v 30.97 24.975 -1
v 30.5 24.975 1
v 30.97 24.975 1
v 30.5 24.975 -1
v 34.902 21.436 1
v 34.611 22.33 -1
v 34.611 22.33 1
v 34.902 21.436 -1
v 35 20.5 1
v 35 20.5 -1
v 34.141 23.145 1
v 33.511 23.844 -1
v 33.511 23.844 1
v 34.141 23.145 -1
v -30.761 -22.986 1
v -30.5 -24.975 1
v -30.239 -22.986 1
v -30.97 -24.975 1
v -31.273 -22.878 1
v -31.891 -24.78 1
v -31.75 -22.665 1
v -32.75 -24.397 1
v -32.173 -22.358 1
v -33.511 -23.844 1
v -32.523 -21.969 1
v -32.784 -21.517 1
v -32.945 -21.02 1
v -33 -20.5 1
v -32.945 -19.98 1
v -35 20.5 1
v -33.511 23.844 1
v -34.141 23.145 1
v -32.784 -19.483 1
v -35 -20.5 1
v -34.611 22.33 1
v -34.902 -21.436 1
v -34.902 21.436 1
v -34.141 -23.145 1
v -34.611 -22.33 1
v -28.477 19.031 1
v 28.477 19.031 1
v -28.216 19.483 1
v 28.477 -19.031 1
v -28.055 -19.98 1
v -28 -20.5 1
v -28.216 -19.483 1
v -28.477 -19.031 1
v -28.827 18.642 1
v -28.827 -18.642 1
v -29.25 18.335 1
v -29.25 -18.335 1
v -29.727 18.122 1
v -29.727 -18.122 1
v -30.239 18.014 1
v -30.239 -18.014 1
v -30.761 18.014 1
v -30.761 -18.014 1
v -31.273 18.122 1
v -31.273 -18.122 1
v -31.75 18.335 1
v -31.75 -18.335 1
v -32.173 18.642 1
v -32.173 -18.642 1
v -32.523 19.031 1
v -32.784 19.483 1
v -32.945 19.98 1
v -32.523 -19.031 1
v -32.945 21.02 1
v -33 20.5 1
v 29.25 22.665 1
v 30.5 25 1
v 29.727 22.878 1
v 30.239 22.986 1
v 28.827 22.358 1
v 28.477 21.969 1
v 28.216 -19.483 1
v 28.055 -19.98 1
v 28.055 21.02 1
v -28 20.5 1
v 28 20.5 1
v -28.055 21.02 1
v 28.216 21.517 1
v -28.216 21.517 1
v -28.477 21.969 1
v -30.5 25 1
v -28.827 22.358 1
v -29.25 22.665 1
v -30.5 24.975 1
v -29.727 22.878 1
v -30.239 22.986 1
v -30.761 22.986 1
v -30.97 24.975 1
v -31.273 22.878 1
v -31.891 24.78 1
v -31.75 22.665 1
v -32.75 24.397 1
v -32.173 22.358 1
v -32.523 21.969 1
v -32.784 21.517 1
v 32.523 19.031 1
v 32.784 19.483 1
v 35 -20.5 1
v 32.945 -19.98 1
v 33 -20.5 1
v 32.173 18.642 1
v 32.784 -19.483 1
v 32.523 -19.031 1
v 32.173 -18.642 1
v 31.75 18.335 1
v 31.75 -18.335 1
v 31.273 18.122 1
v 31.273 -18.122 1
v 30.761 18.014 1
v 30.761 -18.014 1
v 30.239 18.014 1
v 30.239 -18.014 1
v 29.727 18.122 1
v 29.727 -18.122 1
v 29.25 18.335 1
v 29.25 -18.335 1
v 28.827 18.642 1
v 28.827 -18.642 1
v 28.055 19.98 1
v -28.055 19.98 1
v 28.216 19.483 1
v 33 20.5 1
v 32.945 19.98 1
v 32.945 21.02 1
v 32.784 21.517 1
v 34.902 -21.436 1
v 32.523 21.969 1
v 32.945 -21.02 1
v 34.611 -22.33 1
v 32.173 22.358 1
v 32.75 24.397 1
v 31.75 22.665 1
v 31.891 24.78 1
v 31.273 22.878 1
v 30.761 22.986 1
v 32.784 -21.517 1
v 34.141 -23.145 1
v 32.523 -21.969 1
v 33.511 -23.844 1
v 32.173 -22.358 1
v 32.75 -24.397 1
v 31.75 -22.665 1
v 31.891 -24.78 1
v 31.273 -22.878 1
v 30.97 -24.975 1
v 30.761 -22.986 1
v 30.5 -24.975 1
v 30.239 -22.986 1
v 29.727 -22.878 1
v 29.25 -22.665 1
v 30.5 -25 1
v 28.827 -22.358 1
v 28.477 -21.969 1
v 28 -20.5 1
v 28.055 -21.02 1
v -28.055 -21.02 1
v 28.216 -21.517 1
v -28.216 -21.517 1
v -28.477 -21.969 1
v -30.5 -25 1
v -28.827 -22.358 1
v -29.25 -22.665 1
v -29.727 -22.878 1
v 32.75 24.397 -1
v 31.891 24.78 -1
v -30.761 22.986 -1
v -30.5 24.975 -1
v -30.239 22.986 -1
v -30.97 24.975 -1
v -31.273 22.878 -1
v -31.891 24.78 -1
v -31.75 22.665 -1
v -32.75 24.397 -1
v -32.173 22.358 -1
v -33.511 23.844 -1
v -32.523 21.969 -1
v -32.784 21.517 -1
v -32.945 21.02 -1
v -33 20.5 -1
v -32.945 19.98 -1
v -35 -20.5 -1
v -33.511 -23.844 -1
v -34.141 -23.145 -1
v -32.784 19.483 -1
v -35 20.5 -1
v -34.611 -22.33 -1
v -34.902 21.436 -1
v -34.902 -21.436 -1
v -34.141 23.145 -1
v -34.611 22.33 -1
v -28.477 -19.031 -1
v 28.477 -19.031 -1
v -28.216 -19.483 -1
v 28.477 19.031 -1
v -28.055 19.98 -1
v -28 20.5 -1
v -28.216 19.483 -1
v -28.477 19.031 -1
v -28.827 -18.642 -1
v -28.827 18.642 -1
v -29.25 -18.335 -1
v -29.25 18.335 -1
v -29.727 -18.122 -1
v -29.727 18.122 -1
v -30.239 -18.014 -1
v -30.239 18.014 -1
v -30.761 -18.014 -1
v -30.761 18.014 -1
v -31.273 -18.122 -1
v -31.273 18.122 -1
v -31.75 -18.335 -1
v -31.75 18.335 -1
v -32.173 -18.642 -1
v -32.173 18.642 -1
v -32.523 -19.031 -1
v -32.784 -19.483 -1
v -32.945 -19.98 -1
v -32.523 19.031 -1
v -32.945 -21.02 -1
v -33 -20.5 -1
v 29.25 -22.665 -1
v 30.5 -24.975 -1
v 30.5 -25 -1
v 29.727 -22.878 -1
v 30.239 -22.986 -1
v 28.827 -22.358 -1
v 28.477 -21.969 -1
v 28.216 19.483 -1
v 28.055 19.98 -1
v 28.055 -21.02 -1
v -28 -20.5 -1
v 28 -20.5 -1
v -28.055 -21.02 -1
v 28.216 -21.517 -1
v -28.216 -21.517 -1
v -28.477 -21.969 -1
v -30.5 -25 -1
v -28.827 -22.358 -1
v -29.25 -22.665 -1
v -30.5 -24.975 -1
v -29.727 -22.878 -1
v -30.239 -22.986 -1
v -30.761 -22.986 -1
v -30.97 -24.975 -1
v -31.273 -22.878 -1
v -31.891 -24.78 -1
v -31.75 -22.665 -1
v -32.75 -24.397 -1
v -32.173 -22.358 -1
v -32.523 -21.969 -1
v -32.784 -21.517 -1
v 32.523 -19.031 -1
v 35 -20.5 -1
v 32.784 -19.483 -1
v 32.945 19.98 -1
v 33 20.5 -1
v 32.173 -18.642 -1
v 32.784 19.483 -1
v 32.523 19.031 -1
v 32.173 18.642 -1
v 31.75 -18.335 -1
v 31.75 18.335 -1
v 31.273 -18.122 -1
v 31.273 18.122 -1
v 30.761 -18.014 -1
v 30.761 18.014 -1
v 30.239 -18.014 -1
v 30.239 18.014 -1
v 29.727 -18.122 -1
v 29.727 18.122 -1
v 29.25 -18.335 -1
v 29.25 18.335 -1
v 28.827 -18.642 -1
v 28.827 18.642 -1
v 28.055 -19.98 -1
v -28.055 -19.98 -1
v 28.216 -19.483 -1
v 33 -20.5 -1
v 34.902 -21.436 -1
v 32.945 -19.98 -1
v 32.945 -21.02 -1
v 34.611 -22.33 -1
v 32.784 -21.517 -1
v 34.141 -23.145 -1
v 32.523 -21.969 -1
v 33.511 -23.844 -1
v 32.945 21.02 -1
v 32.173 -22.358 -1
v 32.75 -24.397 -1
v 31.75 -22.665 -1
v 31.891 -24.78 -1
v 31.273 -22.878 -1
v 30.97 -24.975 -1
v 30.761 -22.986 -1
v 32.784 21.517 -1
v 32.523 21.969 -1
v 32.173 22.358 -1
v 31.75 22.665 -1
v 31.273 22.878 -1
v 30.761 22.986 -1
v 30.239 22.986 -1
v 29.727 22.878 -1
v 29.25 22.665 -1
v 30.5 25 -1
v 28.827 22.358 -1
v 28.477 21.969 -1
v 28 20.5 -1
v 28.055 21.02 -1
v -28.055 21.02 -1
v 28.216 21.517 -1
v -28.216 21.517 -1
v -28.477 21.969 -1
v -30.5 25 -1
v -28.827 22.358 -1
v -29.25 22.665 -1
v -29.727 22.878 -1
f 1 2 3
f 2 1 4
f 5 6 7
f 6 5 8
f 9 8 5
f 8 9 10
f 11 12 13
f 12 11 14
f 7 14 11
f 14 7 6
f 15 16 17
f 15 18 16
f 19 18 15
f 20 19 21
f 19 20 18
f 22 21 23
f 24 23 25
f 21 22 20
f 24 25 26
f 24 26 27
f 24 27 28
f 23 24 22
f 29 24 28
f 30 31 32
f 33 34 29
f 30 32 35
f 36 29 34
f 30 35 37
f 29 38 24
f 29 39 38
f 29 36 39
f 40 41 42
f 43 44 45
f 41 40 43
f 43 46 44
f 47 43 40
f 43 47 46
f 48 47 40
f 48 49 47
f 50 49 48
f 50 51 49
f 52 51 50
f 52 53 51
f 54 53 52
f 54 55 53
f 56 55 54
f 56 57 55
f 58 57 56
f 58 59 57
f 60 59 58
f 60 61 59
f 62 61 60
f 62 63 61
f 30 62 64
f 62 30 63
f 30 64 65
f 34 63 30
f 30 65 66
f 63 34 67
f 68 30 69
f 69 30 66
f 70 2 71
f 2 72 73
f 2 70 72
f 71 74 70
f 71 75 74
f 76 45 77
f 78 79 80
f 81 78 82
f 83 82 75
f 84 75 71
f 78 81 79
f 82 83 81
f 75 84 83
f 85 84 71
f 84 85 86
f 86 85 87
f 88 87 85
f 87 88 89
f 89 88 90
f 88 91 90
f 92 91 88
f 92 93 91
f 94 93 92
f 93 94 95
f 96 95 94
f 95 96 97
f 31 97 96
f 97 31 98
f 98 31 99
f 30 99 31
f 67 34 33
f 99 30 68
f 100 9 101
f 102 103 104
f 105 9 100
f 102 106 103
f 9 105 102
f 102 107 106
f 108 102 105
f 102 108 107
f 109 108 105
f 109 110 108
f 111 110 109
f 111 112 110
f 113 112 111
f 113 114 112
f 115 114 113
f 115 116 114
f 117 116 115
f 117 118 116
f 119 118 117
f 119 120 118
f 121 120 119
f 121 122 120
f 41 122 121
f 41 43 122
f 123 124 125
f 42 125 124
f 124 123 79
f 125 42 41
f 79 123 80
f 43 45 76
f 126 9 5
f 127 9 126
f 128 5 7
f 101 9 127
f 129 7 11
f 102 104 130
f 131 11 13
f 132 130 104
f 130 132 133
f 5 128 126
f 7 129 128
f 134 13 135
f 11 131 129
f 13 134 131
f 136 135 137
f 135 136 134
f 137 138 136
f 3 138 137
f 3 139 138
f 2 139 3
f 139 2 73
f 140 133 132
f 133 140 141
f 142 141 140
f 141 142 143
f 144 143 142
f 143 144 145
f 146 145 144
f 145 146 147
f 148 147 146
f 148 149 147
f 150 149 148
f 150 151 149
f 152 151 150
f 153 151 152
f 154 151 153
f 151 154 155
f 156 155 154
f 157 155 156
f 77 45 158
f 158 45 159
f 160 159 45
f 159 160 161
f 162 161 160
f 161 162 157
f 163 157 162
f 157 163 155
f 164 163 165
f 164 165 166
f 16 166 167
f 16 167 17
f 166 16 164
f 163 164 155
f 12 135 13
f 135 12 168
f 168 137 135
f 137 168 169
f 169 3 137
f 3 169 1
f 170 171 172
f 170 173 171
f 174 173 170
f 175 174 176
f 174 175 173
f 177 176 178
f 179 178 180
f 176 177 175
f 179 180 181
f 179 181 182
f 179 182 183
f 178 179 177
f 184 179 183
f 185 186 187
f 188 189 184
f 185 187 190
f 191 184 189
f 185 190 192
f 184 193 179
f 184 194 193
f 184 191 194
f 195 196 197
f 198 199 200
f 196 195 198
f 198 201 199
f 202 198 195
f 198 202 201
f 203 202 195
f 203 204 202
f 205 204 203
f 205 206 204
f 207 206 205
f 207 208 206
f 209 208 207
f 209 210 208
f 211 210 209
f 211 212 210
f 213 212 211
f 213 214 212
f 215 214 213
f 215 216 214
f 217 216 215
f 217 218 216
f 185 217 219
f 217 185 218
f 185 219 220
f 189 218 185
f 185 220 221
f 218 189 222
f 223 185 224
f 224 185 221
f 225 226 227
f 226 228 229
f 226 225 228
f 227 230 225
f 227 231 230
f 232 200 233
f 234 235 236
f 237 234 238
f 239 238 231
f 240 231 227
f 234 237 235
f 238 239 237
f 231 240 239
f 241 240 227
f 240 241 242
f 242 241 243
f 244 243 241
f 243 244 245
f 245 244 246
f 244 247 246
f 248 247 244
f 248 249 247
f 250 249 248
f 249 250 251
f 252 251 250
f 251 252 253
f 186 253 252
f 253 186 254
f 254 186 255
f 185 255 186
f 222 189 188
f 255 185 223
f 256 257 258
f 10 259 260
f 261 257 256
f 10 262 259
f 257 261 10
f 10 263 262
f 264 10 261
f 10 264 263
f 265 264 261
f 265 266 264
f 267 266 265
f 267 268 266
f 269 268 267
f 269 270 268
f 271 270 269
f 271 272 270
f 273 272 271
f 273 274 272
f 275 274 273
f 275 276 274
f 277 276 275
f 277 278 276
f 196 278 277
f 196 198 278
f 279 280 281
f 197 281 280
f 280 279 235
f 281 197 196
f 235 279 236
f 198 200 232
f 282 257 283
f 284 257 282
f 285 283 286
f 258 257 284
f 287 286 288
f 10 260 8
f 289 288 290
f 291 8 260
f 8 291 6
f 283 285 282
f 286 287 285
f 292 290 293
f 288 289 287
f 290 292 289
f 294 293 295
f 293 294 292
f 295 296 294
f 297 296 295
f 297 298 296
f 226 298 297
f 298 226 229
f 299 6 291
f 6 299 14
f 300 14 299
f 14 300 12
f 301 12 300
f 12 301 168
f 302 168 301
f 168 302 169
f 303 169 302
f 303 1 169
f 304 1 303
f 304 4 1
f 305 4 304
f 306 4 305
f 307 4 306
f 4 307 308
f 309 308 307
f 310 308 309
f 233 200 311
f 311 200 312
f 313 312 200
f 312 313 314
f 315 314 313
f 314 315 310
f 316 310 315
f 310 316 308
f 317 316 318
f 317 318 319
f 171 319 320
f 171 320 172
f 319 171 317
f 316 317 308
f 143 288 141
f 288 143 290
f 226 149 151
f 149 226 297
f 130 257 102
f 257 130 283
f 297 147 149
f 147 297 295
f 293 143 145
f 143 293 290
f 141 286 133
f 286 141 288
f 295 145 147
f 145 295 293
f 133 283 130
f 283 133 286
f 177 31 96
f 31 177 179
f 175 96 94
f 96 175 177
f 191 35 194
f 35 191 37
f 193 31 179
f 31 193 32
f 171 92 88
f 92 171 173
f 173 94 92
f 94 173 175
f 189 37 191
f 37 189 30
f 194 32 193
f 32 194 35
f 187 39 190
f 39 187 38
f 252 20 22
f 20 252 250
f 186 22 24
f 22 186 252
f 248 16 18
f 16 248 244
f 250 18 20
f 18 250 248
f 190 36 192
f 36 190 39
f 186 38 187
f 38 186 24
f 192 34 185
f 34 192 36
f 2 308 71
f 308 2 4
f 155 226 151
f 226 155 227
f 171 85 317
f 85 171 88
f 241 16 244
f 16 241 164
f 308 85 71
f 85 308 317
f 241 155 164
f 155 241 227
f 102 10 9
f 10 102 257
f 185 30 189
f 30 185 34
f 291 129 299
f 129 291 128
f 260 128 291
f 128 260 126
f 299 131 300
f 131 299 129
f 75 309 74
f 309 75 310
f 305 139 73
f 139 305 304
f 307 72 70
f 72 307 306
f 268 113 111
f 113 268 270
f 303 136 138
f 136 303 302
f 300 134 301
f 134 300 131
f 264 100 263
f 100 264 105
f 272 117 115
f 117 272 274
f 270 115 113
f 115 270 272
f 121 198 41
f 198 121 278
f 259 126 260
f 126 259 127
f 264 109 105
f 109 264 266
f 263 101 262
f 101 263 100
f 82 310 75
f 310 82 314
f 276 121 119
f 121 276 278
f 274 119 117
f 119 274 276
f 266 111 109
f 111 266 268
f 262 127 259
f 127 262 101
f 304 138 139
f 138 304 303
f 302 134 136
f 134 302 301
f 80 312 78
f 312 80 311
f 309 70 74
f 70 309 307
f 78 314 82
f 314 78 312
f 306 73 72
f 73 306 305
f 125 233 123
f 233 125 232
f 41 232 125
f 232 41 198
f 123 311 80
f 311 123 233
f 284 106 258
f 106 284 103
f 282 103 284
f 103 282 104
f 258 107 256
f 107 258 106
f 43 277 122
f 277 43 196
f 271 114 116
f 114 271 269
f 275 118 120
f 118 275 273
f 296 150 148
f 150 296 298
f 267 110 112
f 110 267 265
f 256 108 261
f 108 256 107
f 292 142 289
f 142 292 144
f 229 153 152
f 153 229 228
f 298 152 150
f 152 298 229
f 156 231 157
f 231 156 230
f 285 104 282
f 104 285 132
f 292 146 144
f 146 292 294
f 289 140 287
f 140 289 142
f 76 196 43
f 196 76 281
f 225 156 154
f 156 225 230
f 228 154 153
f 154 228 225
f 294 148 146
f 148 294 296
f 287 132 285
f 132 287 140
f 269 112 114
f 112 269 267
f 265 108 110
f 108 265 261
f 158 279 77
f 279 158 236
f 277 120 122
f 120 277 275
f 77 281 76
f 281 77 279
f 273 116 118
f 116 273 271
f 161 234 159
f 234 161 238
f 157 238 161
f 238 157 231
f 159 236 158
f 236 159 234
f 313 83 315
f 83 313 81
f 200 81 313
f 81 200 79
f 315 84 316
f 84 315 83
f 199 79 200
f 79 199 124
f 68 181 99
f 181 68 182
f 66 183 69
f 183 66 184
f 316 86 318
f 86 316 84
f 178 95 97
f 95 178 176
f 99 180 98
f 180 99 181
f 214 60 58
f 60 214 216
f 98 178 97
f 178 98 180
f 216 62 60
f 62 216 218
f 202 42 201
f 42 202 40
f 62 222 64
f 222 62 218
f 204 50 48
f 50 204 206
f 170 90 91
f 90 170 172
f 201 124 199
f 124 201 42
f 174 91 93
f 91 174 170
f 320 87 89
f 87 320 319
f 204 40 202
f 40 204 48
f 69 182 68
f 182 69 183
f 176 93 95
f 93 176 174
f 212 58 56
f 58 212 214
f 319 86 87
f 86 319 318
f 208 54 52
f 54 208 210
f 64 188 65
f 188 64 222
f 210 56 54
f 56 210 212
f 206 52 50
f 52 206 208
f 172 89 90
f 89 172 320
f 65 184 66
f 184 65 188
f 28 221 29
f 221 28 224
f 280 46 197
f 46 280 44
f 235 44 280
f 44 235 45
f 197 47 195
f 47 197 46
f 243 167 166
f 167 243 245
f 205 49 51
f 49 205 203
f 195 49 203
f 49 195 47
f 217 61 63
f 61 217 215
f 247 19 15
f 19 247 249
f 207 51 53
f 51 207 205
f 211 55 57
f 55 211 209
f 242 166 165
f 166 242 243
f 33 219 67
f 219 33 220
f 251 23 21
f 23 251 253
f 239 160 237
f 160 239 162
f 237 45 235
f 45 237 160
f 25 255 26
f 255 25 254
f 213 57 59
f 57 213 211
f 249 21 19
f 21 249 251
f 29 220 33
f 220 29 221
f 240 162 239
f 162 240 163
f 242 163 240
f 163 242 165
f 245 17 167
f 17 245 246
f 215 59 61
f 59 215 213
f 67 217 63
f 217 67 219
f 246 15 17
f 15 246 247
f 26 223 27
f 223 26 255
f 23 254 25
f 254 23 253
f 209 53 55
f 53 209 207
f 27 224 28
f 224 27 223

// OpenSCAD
/*
Exercício 3
Arredonde os cantos da placa do exercício anterior mantendo o furo a 2mm 
da borda.
*/

C=70; //Comprimento
L=50; //Largura
E=2;  //Espessura
D=5;  //Diâmetro do furo
M=2;  //Margem

RF=D/2+M; //Raio de arredondamento (fillet)

difference(){
    union(){
        cube([C-2*RF, L, E], center=true);
        cube([C, L-2*RF, E], center=true);
        for (i=[1, -1]){
            for (j=[1,-1]){
                translate([i*(C/2-D/2-M),j*(L/2-D/2-M),0])
                    cylinder(r=RF, h=E, center=true, $fs=.4);
            }
        }
    }
    for (i=[1, -1]){
        for (j=[1,-1]){
            translate([i*(C/2-D/2-M),j*(L/2-D/2-M),0])
                cylinder(d=D, h=E+1, center=true, $fs=.4);
        }
    }
}
